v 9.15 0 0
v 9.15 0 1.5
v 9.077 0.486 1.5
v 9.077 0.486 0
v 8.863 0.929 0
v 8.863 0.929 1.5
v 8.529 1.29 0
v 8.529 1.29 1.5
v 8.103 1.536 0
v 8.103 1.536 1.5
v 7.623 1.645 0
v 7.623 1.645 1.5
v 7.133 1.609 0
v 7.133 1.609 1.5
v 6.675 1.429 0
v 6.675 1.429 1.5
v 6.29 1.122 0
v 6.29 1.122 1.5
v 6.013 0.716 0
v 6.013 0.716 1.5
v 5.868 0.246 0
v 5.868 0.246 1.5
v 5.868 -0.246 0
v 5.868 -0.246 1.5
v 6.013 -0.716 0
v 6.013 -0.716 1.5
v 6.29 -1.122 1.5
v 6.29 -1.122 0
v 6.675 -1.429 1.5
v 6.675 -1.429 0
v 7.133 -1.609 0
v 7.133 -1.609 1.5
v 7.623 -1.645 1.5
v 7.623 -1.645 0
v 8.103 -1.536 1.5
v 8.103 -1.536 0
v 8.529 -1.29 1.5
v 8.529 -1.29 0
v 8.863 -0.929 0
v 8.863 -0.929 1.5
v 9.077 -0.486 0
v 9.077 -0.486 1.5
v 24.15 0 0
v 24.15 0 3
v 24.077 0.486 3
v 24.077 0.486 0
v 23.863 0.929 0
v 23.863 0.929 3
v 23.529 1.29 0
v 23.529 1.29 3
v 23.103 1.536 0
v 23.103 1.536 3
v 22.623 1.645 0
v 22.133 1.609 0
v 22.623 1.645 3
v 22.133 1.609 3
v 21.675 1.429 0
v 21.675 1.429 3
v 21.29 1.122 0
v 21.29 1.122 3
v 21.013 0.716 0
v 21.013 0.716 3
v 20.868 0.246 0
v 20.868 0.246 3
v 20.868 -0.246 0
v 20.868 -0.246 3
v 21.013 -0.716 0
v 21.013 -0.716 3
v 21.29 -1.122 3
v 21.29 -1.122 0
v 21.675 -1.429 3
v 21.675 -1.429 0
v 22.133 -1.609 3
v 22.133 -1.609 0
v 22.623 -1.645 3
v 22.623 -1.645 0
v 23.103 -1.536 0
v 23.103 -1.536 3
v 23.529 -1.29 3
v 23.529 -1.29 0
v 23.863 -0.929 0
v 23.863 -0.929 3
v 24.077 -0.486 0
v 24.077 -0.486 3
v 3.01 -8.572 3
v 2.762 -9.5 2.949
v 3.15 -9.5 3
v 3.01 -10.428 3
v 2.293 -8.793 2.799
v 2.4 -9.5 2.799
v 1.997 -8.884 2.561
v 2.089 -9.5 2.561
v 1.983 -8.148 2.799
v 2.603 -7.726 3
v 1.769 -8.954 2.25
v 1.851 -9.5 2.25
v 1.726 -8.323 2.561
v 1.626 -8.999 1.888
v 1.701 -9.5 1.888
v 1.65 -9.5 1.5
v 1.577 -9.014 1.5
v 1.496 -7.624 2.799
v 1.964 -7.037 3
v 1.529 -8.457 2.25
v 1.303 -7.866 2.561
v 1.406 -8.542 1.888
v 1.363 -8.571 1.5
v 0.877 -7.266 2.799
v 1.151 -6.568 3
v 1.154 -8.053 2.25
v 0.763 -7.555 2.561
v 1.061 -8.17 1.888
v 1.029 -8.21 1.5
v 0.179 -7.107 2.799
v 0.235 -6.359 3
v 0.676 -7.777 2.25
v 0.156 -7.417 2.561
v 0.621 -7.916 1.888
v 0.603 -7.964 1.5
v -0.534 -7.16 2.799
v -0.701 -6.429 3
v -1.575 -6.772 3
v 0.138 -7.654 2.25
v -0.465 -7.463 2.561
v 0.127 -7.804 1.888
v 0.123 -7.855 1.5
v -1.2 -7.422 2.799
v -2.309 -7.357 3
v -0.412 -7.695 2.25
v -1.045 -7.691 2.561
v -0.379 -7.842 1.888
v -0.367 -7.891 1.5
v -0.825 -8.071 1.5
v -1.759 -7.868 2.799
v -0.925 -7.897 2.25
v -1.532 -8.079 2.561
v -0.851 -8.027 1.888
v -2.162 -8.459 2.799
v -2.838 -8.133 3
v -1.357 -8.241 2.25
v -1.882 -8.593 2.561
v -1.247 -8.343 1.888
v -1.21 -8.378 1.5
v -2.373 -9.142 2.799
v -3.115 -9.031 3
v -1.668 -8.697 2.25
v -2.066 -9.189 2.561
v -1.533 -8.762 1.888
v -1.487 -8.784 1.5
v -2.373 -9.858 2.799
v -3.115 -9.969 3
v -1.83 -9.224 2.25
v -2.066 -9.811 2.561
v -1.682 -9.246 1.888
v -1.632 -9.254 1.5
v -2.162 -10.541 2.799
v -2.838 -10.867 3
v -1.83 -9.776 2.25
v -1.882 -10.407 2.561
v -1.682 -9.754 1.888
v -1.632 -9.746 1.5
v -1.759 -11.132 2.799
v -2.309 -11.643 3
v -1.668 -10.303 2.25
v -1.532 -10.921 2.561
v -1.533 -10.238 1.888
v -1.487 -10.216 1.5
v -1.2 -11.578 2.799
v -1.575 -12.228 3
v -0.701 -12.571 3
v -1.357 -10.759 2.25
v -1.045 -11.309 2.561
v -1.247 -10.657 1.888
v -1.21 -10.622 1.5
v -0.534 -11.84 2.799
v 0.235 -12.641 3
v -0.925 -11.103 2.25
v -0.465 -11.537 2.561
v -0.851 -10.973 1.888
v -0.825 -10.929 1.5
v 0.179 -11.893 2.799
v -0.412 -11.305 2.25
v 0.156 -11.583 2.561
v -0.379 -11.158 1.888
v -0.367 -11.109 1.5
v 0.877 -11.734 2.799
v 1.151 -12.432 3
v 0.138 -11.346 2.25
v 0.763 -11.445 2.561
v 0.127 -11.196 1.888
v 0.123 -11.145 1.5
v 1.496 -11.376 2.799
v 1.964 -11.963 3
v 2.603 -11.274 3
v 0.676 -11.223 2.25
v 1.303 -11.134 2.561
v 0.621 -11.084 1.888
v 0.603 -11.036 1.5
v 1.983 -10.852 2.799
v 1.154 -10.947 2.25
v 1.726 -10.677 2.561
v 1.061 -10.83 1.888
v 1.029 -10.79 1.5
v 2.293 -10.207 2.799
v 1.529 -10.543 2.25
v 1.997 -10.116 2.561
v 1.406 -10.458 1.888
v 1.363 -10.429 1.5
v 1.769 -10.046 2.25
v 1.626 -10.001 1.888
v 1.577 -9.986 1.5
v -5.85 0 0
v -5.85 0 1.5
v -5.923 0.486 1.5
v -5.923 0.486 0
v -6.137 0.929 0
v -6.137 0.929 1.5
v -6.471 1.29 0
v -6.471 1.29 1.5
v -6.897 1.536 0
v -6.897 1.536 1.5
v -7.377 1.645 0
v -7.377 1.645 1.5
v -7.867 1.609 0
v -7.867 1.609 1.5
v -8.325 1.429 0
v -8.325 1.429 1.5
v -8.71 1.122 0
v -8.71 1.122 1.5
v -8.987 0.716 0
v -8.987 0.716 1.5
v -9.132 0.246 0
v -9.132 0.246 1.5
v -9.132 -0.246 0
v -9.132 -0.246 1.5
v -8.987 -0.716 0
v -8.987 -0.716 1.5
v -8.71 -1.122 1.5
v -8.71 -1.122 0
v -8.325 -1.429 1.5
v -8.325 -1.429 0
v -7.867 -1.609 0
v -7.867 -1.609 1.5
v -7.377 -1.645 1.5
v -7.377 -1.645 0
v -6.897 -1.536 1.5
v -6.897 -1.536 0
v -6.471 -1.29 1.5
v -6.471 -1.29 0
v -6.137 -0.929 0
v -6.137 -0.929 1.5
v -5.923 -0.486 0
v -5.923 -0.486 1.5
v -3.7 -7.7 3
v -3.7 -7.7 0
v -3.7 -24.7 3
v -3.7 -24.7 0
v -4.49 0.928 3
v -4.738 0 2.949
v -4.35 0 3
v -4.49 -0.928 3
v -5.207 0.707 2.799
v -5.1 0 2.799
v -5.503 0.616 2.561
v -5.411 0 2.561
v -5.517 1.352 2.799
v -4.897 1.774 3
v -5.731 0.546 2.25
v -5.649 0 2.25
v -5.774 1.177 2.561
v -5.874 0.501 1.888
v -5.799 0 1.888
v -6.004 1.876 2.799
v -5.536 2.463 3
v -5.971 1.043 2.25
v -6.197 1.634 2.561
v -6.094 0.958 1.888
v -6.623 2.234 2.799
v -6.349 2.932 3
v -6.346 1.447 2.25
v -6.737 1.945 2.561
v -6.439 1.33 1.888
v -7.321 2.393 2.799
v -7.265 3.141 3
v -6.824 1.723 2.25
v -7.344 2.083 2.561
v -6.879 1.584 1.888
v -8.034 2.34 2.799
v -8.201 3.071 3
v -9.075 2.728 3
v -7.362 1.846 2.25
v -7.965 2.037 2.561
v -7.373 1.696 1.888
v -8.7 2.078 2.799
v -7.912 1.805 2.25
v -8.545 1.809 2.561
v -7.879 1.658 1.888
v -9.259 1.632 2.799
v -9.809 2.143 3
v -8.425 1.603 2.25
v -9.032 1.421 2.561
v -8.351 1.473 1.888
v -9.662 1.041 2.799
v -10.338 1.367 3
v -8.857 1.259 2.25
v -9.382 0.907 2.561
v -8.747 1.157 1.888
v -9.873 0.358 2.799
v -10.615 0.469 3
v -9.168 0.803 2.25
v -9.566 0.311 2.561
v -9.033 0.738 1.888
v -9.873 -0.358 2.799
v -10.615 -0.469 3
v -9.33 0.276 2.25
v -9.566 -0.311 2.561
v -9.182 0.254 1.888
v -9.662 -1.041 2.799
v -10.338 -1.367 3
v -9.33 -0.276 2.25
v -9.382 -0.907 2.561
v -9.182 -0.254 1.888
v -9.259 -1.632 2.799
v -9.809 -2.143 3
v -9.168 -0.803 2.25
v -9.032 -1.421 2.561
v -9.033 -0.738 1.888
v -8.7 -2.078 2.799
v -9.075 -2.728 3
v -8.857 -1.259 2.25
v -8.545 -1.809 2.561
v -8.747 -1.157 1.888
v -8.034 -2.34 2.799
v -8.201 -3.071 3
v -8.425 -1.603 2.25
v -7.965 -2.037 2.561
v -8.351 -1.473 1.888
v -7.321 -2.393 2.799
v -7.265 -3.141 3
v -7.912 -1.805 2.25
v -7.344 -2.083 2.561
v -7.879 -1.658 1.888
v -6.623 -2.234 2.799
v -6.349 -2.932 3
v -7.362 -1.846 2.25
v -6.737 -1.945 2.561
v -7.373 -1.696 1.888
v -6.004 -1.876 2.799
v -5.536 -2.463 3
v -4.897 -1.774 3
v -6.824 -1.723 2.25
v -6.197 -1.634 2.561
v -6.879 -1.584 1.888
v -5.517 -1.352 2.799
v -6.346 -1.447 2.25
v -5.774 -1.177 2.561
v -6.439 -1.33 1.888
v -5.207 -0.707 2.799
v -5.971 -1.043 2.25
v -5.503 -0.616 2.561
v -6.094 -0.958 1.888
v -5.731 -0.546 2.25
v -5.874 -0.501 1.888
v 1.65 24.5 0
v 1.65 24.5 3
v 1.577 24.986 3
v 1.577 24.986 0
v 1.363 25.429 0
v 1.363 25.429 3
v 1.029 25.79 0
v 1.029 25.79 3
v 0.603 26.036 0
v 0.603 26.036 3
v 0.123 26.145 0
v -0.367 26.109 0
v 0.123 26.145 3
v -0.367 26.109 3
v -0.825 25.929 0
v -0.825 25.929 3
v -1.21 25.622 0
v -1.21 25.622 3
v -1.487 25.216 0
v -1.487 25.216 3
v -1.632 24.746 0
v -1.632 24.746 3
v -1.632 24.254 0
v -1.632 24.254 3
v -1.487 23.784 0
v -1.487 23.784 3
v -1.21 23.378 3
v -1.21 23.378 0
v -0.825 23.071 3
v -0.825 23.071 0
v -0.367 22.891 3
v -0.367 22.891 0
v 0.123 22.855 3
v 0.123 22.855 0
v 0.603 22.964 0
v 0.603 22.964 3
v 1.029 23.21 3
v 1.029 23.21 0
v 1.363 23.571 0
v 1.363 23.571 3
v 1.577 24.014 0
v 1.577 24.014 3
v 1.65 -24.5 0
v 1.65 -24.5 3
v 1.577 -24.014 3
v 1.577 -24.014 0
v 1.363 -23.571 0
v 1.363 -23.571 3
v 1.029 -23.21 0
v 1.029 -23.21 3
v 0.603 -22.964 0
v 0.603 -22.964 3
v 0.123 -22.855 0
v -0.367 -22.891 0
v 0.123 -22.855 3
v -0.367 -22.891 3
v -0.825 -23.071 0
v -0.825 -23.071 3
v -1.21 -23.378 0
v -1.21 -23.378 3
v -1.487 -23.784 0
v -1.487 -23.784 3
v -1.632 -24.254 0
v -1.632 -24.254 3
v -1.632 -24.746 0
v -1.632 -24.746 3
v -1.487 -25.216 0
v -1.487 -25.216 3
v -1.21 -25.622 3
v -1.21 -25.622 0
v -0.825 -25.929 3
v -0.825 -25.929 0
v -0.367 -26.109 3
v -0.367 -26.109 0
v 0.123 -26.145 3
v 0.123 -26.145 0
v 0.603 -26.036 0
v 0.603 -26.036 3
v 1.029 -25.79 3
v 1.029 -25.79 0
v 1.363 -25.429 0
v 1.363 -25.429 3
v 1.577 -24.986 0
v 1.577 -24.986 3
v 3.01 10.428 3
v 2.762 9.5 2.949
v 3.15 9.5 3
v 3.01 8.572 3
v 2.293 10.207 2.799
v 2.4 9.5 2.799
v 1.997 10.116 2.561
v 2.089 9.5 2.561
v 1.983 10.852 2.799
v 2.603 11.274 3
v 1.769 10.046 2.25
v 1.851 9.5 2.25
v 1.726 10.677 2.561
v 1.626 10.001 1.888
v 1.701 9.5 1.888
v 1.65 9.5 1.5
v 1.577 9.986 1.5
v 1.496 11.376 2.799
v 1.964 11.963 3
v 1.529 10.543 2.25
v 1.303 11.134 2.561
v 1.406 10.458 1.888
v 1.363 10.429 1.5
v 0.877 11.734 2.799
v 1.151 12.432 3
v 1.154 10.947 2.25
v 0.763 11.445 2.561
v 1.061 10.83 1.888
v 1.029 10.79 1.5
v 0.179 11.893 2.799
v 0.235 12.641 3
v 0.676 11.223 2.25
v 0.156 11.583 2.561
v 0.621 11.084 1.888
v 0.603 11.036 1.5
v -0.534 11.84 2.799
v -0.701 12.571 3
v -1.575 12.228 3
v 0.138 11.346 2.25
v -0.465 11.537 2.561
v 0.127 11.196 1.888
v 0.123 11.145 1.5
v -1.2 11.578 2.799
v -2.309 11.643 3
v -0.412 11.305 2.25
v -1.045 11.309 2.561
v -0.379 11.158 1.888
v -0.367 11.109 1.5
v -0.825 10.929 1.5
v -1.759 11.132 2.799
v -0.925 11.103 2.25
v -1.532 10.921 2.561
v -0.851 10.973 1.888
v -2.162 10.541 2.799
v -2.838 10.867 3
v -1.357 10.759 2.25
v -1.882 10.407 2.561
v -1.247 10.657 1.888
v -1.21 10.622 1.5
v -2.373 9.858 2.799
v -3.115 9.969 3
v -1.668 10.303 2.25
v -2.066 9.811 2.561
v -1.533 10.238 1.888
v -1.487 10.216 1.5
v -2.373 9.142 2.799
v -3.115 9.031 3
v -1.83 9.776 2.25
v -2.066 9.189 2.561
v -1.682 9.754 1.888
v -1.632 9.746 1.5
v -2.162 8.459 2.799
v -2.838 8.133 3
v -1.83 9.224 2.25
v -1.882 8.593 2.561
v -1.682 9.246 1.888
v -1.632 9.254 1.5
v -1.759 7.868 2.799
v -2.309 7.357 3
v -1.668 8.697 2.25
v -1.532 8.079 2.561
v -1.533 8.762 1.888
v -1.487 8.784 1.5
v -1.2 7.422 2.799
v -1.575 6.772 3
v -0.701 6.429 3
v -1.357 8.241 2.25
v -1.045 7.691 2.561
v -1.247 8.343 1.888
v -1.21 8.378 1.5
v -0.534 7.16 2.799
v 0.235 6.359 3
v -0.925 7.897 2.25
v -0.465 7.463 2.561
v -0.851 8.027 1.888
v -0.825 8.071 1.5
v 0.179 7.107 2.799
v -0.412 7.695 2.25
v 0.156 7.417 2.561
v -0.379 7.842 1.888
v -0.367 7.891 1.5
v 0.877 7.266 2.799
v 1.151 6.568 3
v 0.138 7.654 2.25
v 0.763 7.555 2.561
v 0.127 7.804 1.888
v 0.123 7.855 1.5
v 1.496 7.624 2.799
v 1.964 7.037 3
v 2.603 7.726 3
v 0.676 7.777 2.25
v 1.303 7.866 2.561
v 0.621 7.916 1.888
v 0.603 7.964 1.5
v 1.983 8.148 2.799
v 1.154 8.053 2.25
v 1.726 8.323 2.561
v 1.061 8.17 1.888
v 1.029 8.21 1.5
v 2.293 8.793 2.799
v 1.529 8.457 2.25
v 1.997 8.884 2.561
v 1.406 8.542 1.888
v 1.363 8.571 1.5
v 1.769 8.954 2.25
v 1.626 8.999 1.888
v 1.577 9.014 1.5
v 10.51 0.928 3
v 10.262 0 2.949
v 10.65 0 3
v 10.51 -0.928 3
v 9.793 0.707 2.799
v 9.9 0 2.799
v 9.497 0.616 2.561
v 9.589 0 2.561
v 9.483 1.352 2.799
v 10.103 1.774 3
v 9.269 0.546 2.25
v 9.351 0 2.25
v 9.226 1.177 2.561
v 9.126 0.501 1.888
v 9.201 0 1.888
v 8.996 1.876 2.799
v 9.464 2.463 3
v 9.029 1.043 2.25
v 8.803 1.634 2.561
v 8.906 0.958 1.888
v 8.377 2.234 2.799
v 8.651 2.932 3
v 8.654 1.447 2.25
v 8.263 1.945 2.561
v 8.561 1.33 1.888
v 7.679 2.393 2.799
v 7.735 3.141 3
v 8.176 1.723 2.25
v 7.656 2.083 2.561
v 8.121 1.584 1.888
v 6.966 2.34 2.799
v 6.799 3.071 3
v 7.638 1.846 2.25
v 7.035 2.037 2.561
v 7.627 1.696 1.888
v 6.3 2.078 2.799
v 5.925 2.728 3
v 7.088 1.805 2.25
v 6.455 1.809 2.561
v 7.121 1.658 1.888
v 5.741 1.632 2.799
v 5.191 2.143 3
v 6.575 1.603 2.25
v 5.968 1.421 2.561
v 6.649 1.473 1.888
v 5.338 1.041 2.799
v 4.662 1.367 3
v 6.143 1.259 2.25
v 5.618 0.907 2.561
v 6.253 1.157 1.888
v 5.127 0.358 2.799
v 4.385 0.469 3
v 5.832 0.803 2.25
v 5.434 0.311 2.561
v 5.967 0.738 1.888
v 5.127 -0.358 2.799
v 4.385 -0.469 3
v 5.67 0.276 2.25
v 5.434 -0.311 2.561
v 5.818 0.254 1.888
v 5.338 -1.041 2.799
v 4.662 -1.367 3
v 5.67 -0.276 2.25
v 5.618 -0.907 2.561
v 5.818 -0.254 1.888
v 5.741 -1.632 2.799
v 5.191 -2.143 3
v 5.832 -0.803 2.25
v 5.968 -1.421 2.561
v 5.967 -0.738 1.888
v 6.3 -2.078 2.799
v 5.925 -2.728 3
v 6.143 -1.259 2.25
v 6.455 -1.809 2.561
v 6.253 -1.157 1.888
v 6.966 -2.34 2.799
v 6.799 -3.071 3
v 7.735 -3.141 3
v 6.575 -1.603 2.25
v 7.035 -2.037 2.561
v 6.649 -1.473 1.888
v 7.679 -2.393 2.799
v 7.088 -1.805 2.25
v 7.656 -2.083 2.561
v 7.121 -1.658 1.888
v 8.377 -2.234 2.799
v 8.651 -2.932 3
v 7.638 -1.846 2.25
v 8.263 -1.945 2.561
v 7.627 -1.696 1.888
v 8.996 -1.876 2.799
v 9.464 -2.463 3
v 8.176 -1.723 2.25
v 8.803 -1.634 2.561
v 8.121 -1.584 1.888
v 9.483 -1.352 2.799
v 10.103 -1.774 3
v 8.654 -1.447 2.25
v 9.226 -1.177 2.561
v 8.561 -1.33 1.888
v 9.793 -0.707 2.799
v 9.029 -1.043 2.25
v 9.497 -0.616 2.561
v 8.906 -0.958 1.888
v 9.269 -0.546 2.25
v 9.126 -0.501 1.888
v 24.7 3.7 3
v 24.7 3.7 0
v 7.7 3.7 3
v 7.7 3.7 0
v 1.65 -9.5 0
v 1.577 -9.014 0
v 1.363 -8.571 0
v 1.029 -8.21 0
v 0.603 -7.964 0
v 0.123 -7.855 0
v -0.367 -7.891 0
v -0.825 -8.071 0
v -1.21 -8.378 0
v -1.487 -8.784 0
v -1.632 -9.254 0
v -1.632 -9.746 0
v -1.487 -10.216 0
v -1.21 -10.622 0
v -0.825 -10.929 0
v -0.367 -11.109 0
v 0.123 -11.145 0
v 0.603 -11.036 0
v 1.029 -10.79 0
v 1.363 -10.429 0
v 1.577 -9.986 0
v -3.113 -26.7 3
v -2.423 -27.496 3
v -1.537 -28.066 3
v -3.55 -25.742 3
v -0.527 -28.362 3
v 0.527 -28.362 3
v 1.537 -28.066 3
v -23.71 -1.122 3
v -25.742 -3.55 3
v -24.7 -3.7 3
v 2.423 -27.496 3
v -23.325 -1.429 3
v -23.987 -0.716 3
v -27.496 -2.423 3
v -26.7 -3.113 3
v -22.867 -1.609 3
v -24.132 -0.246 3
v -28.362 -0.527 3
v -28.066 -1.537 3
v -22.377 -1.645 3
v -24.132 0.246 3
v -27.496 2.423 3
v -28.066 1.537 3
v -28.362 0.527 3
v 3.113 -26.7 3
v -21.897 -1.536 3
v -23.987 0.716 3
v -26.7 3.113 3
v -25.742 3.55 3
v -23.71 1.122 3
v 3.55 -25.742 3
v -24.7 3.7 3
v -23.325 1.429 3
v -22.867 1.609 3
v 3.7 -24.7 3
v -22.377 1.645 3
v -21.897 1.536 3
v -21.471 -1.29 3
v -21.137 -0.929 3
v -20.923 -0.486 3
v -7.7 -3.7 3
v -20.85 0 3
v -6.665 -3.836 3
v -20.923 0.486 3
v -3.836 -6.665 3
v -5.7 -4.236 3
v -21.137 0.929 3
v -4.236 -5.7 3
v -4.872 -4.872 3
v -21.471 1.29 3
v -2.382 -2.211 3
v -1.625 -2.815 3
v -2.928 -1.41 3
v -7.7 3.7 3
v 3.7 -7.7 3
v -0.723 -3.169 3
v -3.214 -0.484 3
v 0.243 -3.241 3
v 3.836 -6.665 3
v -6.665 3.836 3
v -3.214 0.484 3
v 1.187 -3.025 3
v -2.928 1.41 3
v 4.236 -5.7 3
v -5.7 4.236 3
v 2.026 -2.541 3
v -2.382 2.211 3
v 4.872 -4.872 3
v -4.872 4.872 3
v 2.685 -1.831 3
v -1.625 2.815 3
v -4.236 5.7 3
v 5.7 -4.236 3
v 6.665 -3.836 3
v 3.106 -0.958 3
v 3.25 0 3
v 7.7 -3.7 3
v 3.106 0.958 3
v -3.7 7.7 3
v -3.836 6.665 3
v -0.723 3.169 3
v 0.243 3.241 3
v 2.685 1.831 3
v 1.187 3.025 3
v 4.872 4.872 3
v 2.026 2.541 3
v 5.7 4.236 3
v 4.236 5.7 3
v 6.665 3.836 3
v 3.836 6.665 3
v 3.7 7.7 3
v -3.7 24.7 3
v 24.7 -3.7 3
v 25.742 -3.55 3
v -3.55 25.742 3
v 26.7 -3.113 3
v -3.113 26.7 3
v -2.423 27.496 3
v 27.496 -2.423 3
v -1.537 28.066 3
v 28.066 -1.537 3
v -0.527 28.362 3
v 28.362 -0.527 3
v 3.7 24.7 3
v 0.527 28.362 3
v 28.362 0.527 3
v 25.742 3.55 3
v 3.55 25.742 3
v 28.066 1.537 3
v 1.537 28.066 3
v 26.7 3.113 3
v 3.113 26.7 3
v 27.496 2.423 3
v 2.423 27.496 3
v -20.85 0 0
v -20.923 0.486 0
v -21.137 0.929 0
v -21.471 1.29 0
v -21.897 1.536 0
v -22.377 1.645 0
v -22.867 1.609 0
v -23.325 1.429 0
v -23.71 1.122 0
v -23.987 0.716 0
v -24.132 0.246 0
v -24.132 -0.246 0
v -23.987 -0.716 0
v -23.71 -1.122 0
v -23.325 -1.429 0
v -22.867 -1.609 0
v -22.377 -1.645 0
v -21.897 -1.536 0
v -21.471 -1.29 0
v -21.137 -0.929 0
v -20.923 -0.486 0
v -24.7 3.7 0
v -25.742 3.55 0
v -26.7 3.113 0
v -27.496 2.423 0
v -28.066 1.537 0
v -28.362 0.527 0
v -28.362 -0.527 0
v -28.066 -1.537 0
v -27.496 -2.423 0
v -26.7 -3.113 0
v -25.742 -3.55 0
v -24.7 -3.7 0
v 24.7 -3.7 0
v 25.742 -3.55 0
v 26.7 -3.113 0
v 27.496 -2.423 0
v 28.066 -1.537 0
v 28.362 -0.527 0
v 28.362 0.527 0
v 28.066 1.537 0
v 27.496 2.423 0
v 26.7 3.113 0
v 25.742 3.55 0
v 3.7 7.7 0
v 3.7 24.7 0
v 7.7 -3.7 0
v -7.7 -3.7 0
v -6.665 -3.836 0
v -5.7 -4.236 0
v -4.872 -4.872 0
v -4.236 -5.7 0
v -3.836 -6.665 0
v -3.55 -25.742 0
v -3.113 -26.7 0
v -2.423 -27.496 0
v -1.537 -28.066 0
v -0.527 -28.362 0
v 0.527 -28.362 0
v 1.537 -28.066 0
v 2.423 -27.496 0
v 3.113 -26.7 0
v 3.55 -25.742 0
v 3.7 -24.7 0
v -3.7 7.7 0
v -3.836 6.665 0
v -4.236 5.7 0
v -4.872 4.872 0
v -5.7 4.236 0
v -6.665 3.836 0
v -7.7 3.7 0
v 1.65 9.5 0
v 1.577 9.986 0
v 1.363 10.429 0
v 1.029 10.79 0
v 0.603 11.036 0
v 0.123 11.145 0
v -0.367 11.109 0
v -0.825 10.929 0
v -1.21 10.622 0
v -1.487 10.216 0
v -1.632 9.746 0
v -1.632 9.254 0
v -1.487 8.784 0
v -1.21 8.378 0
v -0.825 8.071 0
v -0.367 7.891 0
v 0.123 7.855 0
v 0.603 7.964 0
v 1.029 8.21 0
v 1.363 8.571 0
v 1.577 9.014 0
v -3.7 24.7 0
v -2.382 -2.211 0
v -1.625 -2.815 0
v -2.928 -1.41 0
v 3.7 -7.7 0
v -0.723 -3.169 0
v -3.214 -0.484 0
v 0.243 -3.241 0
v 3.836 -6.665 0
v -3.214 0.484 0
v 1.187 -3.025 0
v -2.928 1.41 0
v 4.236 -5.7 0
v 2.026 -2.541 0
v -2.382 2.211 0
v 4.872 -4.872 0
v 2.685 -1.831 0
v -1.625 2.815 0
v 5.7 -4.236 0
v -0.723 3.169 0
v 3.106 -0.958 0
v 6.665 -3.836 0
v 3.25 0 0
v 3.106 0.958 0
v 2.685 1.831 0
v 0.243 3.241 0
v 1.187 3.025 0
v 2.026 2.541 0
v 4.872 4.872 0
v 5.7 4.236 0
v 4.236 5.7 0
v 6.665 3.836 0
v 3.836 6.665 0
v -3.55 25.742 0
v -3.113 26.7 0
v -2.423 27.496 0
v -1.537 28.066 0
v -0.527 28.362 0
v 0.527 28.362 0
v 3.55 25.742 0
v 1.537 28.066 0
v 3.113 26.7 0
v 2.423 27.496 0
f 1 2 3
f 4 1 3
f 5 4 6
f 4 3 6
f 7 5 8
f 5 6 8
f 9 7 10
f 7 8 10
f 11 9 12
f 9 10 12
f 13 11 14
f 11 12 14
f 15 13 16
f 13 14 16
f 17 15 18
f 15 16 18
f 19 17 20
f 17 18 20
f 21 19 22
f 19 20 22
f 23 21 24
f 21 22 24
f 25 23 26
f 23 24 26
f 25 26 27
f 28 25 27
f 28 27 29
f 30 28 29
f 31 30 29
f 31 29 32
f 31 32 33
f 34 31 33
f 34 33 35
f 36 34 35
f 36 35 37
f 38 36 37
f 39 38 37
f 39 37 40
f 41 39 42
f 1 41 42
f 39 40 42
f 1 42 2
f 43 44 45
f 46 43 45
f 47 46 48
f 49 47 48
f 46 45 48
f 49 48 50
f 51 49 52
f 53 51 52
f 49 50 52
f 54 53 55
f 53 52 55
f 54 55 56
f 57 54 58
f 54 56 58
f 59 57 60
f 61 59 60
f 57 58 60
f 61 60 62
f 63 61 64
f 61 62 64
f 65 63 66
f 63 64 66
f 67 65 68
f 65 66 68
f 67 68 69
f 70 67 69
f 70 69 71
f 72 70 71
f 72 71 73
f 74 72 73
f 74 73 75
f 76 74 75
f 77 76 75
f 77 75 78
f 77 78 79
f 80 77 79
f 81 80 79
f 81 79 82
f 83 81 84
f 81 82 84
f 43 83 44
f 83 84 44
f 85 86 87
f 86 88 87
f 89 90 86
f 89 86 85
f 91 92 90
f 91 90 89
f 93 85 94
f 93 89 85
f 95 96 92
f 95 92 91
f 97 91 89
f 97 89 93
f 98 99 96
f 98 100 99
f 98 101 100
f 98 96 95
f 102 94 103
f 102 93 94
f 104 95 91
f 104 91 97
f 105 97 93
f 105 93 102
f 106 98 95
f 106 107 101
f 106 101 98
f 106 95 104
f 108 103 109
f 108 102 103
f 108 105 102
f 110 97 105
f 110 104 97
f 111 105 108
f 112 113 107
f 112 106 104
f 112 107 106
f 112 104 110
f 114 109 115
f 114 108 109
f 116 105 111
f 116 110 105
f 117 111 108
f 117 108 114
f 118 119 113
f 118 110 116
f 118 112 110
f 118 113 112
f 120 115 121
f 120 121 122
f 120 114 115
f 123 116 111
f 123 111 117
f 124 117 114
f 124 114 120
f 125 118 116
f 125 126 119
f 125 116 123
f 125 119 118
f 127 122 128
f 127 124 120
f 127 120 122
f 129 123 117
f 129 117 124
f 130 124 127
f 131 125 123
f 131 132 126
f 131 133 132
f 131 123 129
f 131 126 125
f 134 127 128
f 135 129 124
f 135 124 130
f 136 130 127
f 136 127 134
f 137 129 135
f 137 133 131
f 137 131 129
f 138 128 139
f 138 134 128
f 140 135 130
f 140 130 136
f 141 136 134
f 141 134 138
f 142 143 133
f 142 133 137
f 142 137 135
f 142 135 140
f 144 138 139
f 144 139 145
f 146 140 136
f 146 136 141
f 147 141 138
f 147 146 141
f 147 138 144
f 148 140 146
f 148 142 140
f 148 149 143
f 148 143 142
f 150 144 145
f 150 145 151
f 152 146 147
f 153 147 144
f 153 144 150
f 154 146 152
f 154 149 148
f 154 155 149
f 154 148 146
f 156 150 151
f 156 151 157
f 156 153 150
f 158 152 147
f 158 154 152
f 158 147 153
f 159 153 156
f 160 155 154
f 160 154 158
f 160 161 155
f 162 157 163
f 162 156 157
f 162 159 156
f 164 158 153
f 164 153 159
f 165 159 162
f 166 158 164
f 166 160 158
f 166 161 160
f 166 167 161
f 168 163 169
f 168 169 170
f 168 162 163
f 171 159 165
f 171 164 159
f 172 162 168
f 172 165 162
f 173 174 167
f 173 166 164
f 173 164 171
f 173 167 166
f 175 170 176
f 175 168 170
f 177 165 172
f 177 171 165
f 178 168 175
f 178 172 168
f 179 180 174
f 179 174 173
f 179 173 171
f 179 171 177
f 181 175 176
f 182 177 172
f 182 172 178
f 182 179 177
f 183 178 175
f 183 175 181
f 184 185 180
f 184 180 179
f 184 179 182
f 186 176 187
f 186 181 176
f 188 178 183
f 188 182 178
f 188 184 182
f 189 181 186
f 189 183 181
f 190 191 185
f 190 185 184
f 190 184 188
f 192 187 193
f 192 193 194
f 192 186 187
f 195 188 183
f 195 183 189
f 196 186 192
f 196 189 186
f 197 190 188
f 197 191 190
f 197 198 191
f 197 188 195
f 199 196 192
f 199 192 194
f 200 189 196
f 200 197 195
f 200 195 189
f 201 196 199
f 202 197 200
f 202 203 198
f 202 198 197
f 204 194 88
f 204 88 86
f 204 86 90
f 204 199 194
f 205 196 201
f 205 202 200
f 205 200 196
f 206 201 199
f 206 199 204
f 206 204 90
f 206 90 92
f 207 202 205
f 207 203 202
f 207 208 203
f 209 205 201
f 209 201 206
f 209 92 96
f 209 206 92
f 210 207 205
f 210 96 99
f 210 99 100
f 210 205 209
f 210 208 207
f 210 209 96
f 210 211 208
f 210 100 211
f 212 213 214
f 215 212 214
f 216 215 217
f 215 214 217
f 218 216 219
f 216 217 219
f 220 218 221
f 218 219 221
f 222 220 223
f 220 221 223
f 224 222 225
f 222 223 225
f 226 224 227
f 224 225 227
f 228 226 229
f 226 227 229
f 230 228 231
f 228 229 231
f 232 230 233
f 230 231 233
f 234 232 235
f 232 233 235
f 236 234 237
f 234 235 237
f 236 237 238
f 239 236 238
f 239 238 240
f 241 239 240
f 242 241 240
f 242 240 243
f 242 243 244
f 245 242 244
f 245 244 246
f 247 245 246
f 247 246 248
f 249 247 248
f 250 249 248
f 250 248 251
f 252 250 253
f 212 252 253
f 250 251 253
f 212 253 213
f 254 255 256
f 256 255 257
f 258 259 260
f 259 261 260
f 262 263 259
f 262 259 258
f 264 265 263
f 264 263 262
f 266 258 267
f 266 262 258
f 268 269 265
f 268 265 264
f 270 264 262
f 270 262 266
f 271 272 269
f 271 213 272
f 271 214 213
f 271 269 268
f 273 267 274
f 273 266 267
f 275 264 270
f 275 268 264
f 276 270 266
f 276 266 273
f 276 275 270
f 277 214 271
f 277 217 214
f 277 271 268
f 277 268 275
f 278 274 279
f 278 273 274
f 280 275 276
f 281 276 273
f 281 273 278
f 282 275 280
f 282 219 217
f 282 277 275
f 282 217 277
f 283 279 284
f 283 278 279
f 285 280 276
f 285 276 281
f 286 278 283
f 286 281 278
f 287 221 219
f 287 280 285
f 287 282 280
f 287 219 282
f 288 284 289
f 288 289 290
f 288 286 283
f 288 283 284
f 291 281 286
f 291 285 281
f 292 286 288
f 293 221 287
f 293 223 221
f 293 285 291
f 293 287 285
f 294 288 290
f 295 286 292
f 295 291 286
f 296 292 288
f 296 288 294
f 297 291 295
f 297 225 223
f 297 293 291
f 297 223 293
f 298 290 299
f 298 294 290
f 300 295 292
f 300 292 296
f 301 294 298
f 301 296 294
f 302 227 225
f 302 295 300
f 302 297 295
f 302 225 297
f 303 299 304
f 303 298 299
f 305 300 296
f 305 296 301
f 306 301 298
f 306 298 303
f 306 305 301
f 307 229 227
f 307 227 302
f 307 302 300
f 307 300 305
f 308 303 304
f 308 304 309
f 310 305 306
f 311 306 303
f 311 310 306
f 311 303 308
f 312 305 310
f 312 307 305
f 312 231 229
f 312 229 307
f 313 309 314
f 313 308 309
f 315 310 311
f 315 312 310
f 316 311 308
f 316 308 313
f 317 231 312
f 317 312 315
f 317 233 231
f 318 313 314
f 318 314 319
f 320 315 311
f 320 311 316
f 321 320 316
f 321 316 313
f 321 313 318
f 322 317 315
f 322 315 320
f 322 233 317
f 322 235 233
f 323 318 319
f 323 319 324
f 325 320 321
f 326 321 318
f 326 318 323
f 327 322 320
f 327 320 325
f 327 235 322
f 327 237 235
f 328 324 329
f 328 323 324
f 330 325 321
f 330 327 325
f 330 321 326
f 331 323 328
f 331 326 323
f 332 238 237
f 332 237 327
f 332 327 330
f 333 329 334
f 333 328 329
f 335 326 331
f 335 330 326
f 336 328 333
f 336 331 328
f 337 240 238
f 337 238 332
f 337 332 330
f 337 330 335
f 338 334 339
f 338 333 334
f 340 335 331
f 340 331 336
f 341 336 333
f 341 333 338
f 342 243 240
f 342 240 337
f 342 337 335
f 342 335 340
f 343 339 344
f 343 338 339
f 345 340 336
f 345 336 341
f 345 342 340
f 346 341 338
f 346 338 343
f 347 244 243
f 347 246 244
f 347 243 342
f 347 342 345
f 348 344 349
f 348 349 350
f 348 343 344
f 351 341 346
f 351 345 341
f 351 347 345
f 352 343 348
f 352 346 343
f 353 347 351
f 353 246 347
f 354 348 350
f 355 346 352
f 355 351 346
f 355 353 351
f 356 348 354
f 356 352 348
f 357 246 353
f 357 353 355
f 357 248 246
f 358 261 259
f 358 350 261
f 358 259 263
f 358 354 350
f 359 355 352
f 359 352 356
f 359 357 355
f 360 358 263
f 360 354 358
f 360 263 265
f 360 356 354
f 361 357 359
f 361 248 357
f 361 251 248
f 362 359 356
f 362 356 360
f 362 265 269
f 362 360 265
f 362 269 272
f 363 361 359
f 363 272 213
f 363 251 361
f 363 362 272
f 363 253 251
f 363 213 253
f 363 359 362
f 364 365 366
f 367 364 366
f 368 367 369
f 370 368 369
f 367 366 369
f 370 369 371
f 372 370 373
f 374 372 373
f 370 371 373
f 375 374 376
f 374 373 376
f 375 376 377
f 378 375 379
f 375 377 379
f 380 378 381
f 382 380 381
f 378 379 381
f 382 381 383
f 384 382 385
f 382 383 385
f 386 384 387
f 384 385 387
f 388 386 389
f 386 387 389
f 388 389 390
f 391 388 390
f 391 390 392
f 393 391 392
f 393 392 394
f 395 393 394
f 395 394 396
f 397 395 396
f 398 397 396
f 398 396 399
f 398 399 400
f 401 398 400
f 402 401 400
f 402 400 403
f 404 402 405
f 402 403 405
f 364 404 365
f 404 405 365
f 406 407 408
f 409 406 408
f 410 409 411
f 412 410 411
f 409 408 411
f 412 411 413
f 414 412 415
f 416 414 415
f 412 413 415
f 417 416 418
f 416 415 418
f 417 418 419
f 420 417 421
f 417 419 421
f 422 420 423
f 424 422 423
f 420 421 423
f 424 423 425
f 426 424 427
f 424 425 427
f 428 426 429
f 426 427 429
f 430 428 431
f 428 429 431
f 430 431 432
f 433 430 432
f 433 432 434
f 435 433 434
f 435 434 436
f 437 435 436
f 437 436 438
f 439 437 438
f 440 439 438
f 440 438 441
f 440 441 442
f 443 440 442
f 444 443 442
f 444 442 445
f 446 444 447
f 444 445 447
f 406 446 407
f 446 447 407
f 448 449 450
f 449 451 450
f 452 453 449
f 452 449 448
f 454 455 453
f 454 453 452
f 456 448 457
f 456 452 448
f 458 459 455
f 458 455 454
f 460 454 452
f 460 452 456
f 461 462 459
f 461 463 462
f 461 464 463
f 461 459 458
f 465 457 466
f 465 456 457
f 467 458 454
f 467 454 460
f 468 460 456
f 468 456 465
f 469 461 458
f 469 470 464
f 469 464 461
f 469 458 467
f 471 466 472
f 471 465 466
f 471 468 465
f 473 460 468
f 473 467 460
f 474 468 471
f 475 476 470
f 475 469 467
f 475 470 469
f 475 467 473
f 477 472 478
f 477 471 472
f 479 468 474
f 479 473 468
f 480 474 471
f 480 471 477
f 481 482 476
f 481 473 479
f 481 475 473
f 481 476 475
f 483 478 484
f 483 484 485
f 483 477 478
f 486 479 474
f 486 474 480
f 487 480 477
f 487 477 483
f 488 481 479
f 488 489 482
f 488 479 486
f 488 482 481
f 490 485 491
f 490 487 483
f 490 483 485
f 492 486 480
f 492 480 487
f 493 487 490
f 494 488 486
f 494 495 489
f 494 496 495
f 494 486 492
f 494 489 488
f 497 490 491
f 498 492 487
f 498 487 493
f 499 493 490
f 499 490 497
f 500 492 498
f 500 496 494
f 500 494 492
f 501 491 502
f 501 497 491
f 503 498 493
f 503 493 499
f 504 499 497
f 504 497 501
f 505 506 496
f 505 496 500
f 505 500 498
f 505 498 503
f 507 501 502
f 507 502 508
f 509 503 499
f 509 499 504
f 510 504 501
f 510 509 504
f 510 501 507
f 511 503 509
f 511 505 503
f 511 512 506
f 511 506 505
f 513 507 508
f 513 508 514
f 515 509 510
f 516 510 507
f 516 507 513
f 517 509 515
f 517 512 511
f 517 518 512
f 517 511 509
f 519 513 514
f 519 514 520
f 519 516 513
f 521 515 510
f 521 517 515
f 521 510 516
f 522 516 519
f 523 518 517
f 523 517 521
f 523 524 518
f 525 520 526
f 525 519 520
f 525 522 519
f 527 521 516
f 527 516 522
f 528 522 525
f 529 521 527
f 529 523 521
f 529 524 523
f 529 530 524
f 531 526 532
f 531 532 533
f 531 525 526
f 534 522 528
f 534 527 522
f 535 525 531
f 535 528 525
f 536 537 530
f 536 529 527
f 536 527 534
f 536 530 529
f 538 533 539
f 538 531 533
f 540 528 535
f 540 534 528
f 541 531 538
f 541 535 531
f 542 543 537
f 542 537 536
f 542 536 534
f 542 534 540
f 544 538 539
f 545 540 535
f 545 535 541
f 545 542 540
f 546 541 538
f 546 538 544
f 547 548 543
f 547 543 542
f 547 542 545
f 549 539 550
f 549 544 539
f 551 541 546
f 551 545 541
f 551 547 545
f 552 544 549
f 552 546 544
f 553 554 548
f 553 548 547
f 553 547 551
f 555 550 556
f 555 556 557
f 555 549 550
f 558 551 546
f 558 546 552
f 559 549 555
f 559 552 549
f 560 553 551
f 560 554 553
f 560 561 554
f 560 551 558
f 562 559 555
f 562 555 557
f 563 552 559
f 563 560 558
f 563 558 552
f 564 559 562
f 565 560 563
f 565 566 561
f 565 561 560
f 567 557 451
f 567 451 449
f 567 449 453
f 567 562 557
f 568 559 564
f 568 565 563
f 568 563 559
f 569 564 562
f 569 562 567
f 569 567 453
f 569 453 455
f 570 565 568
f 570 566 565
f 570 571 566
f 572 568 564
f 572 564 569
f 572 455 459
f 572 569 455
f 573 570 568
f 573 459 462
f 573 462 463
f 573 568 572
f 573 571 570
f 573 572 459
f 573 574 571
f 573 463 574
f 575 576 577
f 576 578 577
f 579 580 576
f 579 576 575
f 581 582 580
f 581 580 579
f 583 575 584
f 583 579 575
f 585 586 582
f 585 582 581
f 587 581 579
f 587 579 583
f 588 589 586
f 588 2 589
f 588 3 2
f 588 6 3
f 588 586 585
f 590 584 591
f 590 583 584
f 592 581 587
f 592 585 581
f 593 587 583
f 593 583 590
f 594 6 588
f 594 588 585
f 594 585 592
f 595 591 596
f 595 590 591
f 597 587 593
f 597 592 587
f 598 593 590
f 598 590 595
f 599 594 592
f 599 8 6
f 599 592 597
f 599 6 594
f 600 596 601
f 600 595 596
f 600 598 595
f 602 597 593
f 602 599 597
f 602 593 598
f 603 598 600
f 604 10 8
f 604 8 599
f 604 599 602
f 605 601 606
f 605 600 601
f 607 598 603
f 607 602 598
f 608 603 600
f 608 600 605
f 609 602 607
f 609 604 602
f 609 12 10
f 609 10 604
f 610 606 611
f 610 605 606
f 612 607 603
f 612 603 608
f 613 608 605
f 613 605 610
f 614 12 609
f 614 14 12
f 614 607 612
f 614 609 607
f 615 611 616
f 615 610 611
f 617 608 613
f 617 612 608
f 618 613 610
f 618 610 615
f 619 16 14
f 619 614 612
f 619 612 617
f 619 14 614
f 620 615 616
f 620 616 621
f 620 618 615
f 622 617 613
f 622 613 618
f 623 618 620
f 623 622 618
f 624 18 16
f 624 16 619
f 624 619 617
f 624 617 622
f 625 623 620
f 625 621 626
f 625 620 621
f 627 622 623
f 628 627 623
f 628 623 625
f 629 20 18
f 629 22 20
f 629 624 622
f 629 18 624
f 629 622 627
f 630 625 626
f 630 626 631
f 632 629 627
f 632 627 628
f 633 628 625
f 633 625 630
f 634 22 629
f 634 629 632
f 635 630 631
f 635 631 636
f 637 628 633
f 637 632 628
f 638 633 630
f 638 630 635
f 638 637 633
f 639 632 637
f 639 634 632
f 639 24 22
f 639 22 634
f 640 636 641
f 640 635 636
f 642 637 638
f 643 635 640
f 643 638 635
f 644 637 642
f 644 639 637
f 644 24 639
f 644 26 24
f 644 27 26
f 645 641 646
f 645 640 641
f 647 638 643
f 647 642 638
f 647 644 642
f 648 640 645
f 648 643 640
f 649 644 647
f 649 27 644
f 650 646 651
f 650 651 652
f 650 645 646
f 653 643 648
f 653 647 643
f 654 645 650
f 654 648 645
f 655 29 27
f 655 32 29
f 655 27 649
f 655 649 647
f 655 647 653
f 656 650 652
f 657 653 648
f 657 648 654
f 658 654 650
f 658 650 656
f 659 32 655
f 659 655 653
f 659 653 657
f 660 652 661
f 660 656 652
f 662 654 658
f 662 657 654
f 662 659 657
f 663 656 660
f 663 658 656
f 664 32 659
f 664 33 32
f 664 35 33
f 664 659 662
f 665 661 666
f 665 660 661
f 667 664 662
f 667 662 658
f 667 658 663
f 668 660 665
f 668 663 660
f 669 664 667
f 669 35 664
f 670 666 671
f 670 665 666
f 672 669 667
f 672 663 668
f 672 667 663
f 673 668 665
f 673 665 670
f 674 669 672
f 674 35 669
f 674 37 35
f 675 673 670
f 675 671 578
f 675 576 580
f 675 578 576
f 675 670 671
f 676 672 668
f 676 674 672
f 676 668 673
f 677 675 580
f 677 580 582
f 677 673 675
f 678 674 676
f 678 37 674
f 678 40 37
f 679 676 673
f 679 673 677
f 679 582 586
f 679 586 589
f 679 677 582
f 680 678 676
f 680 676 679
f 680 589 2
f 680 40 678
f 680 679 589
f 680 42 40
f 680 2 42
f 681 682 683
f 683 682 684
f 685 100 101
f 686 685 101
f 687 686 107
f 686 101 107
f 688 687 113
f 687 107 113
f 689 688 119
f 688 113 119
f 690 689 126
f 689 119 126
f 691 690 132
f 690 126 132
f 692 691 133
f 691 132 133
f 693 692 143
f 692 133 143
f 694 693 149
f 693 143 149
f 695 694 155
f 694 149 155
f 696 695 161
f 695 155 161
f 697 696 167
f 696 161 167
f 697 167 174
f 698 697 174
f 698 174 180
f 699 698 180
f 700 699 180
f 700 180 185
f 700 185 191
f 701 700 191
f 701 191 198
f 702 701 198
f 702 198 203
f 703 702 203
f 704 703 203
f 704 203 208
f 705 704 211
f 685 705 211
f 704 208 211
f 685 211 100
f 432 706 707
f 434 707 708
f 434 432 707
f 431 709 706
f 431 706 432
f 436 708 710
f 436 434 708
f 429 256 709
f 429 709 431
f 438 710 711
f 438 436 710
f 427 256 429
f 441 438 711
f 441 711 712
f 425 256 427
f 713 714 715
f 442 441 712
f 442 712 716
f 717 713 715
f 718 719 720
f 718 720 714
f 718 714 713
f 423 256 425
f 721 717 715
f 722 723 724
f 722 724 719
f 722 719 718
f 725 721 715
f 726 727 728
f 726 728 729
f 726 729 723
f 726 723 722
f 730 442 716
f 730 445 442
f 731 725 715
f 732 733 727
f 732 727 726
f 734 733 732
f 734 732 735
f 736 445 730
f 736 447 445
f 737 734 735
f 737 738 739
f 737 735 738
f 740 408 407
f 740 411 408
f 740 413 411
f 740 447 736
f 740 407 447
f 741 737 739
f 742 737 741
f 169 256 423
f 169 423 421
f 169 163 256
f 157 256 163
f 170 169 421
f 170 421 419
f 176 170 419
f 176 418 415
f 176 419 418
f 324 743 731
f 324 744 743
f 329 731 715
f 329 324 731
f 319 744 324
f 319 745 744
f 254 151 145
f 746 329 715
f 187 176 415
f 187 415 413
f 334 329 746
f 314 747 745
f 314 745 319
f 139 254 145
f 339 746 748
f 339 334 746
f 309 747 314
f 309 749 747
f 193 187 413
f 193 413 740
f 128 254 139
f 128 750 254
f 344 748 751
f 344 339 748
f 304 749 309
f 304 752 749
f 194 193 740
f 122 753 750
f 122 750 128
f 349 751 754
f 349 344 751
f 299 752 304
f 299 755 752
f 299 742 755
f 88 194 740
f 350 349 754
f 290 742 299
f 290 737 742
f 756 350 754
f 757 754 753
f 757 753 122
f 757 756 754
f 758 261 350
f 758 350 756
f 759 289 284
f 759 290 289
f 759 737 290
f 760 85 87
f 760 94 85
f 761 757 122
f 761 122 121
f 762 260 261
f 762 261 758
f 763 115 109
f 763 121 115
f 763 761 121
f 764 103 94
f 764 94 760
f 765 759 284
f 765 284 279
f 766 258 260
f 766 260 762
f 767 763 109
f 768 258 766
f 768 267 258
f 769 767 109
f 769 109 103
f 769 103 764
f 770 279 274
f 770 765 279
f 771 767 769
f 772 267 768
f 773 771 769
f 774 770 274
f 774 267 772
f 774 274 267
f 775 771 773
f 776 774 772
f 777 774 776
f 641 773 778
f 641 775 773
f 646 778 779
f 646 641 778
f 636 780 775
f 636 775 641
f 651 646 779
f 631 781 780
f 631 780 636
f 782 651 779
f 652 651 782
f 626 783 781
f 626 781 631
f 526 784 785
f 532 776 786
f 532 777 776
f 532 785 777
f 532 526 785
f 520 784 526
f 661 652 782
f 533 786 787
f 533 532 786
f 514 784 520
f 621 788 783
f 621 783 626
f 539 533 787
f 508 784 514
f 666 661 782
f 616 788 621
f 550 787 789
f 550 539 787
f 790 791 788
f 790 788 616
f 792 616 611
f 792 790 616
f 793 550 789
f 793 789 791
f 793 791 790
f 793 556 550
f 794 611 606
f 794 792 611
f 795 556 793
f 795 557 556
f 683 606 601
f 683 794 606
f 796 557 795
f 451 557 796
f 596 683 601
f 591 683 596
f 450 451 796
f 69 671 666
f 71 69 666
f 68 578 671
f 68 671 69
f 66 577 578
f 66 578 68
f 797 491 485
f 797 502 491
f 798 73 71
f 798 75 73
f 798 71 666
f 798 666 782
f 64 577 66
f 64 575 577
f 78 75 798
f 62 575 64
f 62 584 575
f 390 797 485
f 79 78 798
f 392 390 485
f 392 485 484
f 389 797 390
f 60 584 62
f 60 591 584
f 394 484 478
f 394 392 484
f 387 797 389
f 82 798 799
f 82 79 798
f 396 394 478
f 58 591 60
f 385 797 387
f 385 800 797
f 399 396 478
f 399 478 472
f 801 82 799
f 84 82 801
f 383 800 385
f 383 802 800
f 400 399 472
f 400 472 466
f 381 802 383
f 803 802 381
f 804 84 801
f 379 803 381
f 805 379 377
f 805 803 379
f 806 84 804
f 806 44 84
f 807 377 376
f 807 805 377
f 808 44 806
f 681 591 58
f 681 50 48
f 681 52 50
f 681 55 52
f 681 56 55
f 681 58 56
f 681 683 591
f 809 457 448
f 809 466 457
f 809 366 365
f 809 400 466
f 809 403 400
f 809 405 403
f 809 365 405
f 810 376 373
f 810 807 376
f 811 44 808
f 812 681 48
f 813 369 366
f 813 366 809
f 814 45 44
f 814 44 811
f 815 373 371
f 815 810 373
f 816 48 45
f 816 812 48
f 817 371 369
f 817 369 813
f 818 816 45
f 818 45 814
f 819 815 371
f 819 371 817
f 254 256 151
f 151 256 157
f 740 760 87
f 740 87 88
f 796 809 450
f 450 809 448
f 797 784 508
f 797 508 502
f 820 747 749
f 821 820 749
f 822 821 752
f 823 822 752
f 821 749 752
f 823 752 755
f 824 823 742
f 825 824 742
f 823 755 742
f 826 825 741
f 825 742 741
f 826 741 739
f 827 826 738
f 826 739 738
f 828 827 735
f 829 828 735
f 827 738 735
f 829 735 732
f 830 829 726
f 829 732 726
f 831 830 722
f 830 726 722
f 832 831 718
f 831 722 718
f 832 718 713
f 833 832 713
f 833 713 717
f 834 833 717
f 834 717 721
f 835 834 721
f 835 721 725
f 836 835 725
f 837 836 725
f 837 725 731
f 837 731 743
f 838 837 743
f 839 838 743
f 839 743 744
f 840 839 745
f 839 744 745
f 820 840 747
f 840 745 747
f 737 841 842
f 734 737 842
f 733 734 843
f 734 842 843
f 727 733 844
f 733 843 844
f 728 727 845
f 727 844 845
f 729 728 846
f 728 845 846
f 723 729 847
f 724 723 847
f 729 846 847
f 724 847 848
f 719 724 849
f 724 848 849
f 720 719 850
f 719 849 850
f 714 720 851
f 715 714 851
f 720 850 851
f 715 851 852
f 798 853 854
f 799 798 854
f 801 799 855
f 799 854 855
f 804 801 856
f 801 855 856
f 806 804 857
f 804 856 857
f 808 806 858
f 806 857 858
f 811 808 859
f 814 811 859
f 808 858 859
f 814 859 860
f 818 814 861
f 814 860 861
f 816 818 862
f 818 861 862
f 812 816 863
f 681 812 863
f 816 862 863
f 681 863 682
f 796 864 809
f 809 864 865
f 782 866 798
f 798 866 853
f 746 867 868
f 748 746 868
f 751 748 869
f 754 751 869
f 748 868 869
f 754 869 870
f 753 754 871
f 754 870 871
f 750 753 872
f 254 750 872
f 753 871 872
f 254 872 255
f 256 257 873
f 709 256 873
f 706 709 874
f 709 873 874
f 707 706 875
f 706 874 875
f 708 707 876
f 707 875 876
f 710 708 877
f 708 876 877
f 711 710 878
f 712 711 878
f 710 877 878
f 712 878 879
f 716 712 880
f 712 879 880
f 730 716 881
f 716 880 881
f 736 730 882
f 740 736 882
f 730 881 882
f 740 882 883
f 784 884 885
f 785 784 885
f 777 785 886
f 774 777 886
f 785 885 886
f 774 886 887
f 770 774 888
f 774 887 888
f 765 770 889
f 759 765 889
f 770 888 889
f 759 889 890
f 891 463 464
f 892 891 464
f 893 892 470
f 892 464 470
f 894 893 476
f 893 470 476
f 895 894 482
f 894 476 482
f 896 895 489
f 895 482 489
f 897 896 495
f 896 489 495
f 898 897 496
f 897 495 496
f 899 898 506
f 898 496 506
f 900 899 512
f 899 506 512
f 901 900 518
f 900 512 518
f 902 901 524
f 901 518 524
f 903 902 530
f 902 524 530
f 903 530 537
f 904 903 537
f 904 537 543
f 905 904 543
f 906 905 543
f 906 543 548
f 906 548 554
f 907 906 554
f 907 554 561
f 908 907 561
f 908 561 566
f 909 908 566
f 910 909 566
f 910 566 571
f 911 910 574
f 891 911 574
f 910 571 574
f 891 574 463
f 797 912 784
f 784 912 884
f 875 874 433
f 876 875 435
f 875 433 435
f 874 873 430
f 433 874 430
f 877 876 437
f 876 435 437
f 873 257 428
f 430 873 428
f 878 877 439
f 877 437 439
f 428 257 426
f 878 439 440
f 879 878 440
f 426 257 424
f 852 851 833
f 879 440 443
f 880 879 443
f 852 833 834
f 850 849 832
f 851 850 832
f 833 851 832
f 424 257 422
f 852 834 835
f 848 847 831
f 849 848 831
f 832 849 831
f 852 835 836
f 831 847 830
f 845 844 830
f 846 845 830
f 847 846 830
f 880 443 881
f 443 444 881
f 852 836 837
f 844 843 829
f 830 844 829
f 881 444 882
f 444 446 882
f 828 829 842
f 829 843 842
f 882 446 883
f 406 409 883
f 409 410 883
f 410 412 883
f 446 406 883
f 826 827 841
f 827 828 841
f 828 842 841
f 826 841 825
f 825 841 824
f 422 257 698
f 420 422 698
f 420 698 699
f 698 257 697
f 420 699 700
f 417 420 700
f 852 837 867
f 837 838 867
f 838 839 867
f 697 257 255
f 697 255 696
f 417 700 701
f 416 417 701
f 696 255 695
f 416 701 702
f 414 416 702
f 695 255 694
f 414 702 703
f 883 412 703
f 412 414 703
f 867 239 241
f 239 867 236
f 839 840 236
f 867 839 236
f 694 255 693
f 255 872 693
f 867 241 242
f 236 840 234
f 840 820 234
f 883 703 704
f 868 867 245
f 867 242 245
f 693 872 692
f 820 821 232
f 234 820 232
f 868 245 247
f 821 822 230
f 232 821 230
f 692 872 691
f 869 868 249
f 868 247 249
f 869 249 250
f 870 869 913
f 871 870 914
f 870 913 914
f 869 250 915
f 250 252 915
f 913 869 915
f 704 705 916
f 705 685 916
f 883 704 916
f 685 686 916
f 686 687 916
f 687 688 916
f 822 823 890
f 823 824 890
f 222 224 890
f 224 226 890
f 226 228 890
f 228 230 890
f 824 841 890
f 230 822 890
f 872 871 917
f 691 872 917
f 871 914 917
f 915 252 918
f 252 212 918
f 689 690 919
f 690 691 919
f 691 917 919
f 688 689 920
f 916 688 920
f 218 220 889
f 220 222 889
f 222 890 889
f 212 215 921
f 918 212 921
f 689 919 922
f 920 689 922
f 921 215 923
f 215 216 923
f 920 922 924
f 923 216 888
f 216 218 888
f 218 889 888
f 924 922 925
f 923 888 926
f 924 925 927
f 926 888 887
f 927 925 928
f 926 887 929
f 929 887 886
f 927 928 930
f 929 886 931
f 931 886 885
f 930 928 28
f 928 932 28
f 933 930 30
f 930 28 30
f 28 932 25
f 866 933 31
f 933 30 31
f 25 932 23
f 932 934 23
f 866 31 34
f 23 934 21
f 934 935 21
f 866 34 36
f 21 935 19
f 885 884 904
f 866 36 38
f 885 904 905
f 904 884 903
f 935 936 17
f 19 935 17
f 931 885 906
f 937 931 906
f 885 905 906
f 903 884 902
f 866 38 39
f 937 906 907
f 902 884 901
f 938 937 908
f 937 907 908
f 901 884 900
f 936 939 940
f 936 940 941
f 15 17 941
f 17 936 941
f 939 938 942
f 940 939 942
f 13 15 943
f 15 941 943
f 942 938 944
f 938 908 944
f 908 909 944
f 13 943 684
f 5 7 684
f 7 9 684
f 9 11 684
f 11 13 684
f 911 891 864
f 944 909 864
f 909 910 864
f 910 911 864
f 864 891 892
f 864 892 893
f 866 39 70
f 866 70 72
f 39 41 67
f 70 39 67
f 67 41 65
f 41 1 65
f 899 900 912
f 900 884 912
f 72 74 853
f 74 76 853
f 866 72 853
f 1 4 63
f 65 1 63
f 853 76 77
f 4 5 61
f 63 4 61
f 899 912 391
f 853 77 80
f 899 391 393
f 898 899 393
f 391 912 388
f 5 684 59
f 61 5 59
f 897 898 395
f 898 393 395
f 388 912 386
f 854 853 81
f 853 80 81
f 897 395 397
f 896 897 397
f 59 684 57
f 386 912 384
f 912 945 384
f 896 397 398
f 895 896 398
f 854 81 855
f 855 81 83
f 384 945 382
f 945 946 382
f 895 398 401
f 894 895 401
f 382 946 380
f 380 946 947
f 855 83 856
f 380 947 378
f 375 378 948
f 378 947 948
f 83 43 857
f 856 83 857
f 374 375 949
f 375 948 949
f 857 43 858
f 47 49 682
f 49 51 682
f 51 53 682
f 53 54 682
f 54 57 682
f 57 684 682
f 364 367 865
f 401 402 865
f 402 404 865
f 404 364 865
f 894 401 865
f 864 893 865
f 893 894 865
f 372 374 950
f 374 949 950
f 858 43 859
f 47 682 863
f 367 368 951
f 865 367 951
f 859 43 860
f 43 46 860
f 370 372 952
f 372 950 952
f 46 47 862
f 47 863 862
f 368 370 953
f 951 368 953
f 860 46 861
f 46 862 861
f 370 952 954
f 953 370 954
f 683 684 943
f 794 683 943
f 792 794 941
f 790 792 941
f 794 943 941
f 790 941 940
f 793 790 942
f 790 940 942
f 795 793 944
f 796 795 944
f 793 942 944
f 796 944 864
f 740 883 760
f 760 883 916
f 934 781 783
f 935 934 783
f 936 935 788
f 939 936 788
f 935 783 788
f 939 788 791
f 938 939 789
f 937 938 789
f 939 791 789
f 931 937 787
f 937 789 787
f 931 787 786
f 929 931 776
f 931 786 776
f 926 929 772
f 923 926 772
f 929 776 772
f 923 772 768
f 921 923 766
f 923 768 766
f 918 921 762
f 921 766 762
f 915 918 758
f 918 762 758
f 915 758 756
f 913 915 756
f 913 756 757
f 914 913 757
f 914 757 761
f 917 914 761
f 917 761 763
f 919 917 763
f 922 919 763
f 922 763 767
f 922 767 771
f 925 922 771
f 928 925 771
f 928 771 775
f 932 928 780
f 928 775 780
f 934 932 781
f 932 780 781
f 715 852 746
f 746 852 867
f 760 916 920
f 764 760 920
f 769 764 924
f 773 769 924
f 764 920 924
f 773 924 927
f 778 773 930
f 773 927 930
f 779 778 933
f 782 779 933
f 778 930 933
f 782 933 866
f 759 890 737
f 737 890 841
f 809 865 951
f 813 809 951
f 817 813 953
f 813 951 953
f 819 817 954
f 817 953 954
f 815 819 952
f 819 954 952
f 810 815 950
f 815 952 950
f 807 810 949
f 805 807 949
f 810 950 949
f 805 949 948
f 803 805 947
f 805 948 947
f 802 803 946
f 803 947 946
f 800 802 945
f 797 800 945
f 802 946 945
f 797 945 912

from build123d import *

# Parameters (mm, degrees)
SALIENTE_EXTRUIR2_DEPTH = 3
CROQUIS3_R              = 3.25
CROQUIS3_R_2            = 1.65
CORTAR_EXTRUIR1_DEPTH   = 3
REDONDEO1_R             = 1.5
REDONDEO2_R             = 1.5
REDONDEO3_R             = 1.5
REDONDEO4_R             = 1.5


with BuildPart() as part:
    # Croquis1 → Saliente-Extruir2 (new body)
    with BuildSketch(Plane.XY):
        with BuildLine():
            Line((-7.7, 3.7), (-24.7, 3.7))
            ThreePointArc((-24.7, 3.7), (-28.4, 0), (-24.7, -3.7))
            Line((-24.7, -3.7), (-7.7, -3.7))
            ThreePointArc((-7.7, -3.7), (-4.871572875, -4.871572875), (-3.7, -7.7))
            Line((-3.7, -7.7), (-3.7, -24.7))
            ThreePointArc((-3.7, -24.7), (0, -28.4), (3.7, -24.7))
            Line((3.7, -24.7), (3.7, -7.7))
            ThreePointArc((3.7, -7.7), (4.871572875, -4.871572875), (7.7, -3.7))
            Line((7.7, -3.7), (24.7, -3.7))
            ThreePointArc((24.7, -3.7), (28.4, 0), (24.7, 3.7))
            Line((24.7, 3.7), (7.7, 3.7))
            ThreePointArc((7.7, 3.7), (4.871572875, 4.871572875), (3.7, 7.7))
            Line((3.7, 7.7), (3.7, 24.7))
            ThreePointArc((3.7, 24.7), (0, 28.4), (-3.7, 24.7))
            Line((-3.7, 24.7), (-3.7, 7.7))
            ThreePointArc((-3.7, 7.7), (-4.871572875, 4.871572875), (-7.7, 3.7))
        make_face()
    extrude(amount=SALIENTE_EXTRUIR2_DEPTH)

    # Croquis3 → Cortar-Extruir1 (cut)
    with BuildSketch(Plane.XY.offset(3)):
        Circle(CROQUIS3_R)
        with Locations((-7.5, 0)):
            Circle(CROQUIS3_R_2)
        with Locations((-22.5, 0)):
            Circle(CROQUIS3_R_2)
        with Locations((0, -9.5)):
            Circle(CROQUIS3_R_2)
        with Locations((7.5, 0)):
            Circle(CROQUIS3_R_2)
        with Locations((0, 9.5)):
            Circle(CROQUIS3_R_2)
        with Locations((0, 24.5)):
            Circle(CROQUIS3_R_2)
        with Locations((22.5, 0)):
            Circle(CROQUIS3_R_2)
        with Locations((0, -24.5)):
            Circle(CROQUIS3_R_2)
    extrude(amount=-CORTAR_EXTRUIR1_DEPTH, mode=Mode.SUBTRACT)

    # Redondeo1
    redondeo1_edges = [part.edges().sort_by_distance(p)[0] for p in [
        (-9.15, 0, 3),
    ]]
    fillet(redondeo1_edges, radius=REDONDEO1_R)

    # Redondeo2
    redondeo2_edges = [part.edges().sort_by_distance(p)[0] for p in [
        (-1.65, 9.5, 3),
    ]]
    fillet(redondeo2_edges, radius=REDONDEO2_R)

    # Redondeo3
    redondeo3_edges = [part.edges().sort_by_distance(p)[0] for p in [
        (5.85, 0, 3),
    ]]
    fillet(redondeo3_edges, radius=REDONDEO3_R)

    # Redondeo4
    redondeo4_edges = [part.edges().sort_by_distance(p)[0] for p in [
        (-1.65, -9.5, 3),
    ]]
    fillet(redondeo4_edges, radius=REDONDEO4_R)


solid = part.part
